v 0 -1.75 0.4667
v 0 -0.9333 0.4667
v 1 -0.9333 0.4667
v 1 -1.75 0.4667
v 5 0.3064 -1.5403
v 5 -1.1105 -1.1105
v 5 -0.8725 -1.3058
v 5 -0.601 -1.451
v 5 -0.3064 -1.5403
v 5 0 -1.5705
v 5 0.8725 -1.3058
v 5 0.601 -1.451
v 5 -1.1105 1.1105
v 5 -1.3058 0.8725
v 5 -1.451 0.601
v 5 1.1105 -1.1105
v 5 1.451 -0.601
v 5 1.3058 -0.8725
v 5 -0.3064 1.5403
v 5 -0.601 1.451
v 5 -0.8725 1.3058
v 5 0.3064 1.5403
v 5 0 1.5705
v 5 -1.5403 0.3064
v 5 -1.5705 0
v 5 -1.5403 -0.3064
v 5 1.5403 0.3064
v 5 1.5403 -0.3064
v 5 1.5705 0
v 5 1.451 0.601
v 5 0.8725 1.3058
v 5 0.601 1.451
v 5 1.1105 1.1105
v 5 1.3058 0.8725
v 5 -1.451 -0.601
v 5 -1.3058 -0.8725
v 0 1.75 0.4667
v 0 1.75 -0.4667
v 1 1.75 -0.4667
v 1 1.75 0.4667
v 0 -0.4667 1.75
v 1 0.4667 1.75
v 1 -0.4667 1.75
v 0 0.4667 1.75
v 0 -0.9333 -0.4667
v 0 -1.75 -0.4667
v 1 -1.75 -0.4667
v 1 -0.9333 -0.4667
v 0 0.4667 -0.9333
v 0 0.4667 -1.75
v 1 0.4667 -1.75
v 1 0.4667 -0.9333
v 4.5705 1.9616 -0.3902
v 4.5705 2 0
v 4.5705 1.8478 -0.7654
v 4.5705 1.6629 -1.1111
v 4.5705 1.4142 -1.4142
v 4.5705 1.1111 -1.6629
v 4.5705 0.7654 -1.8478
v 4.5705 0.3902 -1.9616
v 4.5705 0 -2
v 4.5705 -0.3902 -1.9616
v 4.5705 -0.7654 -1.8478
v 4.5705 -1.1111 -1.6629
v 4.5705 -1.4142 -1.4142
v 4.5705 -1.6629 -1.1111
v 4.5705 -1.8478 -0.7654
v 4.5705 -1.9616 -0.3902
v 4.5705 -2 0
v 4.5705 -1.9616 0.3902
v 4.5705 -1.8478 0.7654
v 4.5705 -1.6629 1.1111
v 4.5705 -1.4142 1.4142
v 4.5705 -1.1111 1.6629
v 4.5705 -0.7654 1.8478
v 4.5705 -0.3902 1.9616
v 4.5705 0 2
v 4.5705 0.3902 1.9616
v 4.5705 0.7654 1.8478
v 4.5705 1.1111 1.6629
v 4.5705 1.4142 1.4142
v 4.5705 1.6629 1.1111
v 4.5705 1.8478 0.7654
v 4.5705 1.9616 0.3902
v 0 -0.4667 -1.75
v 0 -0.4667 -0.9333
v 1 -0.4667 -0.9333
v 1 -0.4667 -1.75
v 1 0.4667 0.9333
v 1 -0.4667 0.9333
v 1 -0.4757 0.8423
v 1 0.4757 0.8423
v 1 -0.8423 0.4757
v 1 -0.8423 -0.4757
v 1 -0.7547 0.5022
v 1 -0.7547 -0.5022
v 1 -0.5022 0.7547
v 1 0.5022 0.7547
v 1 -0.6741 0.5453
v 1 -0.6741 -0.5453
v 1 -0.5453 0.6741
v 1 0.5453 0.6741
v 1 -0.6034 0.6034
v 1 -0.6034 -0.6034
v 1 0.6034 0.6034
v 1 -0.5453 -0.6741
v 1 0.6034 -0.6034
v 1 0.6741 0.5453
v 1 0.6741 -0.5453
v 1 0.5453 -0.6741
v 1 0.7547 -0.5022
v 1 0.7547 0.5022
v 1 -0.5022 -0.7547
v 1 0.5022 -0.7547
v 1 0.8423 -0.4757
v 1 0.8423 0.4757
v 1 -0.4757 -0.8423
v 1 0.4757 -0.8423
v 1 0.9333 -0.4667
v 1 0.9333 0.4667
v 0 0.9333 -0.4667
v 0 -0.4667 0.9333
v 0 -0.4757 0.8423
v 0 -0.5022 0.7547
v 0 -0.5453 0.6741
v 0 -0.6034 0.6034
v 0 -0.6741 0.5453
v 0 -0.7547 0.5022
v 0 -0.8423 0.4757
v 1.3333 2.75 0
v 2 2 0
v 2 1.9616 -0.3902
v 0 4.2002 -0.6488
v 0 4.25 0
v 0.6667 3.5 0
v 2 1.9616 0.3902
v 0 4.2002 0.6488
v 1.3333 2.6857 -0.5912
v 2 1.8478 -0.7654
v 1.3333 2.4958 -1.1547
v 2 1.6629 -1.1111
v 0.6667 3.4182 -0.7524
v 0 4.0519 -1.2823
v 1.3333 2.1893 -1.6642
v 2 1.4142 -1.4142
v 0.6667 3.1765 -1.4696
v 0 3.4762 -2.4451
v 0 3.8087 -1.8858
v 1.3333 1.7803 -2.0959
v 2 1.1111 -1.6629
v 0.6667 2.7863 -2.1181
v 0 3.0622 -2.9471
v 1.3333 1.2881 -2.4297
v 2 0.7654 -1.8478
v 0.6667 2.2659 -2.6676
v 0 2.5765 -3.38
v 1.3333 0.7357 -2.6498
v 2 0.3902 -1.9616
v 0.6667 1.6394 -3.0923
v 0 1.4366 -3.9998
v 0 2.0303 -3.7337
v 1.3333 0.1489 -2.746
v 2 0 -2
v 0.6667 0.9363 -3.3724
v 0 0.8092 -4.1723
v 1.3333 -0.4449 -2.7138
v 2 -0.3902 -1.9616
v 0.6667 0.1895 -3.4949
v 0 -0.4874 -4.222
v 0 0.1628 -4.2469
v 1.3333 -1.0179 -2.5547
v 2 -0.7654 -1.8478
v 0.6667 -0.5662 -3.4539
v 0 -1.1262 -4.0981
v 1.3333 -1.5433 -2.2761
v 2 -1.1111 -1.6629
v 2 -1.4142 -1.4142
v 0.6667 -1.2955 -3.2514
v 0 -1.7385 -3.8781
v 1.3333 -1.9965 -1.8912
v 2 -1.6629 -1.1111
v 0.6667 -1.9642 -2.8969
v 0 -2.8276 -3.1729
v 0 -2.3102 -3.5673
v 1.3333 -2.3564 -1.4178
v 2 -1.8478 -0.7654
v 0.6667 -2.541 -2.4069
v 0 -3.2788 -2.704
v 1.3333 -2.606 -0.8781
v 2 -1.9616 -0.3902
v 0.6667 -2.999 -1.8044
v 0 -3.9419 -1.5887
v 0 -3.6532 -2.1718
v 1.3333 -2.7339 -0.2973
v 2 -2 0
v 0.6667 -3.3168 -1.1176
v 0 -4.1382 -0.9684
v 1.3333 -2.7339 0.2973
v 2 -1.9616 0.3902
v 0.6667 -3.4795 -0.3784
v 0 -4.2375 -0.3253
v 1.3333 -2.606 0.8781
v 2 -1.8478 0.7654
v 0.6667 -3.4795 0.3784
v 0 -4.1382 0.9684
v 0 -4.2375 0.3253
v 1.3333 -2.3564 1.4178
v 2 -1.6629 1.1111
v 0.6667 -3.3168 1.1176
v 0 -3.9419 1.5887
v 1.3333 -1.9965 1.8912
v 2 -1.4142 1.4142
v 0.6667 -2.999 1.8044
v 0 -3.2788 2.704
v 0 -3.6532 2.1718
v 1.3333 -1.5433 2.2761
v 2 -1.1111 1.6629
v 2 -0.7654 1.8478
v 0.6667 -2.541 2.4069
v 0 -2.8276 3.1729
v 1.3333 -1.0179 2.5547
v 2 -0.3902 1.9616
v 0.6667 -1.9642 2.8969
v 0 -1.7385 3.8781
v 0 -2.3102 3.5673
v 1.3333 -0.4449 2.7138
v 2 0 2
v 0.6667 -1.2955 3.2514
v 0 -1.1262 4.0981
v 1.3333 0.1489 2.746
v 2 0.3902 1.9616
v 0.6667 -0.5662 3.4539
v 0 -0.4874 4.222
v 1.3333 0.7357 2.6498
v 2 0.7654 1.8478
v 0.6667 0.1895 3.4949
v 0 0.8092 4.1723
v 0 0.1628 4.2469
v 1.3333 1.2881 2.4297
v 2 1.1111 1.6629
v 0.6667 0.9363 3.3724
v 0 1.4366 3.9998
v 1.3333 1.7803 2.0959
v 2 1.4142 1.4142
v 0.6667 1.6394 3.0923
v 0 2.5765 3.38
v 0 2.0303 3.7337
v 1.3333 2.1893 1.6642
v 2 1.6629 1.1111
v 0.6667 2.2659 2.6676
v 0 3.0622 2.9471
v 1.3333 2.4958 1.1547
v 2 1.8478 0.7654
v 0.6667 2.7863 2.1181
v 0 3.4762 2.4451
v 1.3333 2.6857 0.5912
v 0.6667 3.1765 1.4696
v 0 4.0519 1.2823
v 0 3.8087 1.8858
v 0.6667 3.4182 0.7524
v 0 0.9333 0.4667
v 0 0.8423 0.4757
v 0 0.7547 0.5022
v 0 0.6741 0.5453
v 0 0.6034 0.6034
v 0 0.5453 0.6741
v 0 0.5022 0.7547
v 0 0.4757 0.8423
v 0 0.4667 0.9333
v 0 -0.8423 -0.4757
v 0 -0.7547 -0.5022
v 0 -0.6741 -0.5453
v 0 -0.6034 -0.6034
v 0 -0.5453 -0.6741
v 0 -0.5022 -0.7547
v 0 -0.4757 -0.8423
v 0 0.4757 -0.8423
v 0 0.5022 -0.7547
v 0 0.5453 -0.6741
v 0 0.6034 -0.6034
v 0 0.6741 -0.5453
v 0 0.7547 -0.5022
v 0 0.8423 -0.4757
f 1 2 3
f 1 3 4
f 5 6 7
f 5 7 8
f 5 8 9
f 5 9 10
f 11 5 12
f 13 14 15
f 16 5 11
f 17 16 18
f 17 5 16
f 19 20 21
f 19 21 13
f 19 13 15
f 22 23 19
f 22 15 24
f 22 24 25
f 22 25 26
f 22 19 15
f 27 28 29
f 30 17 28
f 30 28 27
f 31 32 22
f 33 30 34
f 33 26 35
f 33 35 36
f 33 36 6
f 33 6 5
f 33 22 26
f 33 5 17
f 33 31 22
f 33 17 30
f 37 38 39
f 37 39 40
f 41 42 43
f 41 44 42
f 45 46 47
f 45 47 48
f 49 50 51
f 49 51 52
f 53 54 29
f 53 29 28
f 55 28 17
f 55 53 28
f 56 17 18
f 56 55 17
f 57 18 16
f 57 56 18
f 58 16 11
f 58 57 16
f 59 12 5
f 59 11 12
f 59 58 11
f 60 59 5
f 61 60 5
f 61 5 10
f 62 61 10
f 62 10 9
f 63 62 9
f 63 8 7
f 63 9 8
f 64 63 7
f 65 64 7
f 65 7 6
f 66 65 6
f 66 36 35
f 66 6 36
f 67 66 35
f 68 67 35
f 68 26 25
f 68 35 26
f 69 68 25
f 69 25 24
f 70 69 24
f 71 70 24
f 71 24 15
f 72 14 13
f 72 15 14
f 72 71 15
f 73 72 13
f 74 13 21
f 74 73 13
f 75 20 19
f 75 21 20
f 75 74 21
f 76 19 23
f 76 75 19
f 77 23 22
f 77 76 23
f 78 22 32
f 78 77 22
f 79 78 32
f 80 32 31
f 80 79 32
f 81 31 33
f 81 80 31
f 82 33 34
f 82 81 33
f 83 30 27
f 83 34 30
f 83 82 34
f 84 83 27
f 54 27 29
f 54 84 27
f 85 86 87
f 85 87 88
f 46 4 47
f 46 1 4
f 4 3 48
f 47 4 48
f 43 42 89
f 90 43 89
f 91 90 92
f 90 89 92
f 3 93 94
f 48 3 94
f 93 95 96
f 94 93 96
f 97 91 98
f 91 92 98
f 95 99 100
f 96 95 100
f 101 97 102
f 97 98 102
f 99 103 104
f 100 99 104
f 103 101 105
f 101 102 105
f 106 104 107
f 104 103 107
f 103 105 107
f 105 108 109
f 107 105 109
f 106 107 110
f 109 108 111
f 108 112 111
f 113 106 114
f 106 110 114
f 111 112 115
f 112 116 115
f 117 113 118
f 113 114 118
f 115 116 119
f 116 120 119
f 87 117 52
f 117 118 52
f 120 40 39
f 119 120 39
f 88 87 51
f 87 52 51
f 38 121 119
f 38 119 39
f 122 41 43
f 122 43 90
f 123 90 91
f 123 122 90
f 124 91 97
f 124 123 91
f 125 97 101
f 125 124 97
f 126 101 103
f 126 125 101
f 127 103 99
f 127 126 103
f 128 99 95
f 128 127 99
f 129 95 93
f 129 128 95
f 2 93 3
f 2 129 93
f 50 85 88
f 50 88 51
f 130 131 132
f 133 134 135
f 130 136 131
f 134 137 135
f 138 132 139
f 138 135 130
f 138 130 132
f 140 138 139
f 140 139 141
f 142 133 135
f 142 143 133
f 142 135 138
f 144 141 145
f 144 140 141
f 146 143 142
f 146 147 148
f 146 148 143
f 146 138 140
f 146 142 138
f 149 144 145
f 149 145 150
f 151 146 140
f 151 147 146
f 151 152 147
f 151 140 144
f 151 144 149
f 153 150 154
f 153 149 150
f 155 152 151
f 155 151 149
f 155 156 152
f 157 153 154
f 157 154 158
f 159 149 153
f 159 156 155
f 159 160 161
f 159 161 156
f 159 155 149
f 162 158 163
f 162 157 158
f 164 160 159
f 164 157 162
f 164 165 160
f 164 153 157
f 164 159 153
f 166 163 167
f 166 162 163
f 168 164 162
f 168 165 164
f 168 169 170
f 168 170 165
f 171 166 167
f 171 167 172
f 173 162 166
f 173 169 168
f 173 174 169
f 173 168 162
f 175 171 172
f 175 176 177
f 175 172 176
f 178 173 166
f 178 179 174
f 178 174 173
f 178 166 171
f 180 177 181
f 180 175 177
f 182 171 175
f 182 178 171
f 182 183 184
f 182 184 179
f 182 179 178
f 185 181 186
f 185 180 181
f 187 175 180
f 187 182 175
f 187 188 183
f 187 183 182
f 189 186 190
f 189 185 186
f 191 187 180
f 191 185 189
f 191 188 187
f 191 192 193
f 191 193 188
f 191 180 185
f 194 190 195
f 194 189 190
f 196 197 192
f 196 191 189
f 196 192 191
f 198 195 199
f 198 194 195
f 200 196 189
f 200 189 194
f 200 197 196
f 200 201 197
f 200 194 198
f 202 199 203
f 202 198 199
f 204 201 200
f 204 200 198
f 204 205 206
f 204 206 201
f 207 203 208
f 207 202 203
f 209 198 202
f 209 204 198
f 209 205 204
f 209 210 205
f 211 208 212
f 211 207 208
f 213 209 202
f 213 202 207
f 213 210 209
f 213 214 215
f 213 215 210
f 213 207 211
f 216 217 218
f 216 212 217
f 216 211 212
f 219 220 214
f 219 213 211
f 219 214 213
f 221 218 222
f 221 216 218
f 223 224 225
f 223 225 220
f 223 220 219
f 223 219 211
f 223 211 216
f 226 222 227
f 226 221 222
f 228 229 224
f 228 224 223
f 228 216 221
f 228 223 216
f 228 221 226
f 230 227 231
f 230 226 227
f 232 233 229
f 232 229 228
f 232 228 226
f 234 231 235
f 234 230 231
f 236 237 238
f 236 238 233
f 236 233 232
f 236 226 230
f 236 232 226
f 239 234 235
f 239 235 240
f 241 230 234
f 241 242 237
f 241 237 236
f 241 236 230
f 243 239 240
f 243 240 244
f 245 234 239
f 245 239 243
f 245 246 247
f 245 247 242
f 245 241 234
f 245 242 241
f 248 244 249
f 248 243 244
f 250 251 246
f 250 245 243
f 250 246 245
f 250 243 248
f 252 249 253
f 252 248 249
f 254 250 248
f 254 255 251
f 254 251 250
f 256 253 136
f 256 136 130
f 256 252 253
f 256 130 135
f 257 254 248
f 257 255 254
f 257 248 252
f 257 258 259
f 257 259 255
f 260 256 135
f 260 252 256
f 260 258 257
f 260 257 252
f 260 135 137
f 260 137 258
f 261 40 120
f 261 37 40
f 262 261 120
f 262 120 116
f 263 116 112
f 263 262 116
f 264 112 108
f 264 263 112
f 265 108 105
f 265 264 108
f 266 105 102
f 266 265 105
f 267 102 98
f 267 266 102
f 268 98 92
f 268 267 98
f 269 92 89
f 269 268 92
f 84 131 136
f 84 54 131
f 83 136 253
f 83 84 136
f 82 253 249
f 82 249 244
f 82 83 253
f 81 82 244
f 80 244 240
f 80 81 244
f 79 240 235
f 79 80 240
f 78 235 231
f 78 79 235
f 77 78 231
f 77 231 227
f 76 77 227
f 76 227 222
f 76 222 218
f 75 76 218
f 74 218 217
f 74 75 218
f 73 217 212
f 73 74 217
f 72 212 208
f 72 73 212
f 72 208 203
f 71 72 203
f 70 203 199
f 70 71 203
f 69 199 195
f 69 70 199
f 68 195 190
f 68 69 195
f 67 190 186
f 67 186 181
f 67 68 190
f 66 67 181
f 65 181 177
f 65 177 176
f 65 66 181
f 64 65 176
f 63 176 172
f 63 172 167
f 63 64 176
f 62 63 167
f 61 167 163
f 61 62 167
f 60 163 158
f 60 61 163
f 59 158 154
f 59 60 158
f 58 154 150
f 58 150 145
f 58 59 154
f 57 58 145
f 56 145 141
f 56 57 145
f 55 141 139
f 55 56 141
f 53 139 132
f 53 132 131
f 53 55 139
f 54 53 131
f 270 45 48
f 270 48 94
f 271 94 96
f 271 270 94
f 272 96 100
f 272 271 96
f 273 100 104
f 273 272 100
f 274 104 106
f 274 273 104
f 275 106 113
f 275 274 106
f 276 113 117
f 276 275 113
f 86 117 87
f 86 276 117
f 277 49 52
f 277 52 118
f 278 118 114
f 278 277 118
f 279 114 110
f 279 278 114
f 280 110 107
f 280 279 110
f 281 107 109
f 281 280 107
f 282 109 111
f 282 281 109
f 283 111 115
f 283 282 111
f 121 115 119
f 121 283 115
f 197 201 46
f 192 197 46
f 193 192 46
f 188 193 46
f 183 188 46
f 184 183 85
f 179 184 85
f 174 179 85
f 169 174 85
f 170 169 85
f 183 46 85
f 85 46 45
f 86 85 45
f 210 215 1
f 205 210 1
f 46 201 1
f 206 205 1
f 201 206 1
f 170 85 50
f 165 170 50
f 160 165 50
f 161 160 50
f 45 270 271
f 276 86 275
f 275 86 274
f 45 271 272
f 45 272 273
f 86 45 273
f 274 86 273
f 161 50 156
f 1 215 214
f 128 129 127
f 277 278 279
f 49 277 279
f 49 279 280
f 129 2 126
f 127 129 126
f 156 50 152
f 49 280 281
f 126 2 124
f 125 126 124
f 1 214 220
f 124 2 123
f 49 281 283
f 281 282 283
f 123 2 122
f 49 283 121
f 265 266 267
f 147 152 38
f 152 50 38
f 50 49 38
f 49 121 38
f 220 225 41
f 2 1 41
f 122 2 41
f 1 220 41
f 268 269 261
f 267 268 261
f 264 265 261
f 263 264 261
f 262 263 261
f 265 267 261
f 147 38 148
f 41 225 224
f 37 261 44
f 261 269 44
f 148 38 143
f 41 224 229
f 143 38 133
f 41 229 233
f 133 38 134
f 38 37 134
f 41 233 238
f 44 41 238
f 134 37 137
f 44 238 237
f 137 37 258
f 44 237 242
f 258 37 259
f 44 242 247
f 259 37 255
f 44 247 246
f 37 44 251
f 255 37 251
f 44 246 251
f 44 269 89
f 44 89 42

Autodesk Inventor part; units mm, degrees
sketch "Sketch_1" plane through (0, 0, 0) normal (0, 0, 1) x (1, 0, 0)
  line L0 (5, 0) -> (0, 0)
  line L1 (0, 0) -> (0, 4.25)
  line L2 (0, 4.25) -> (2, 2)
  line L3 (2, 2) -> (4.5705, 2)
  line L4 (4.5705, 2) -> (5, 1.5705)
  line L5 (5, 1.5705) -> (5, 0)
  line L6 (5, 0) -> (0, 0)
revolve "Revolution1" add sketch "Sketch_1" angle 360 about axis through (5, 0, 0) along (1, 0, 0)
thread "Thread1" size "M4x0.7" class "6g" standard "ISO Metric profile" length 1.8266
sketch "_____1" plane through (0, 0, 0) normal (1, 0, 0) x (0, 0, -1)
  line L0 (-1.75, 0.4667) -> (-1.75, -0.4667)
  line L1 (-1.75, -0.4667) -> (-0.9333, -0.4667)
  arc A0 (-0.4667, -0.9333) -> (-0.9333, -0.4667) centre (-0.9333, -0.9333) ccw
  line L2 (-0.4667, -0.9333) -> (-0.4667, -1.75)
  line L3 (-0.4667, -1.75) -> (0.4667, -1.75)
  line L4 (0.4667, -1.75) -> (0.4667, -0.9333)
  arc A1 (0.9333, -0.4667) -> (0.4667, -0.9333) centre (0.9333, -0.9333) ccw
  line L5 (0.9333, -0.4667) -> (1.75, -0.4667)
  line L6 (1.75, -0.4667) -> (1.75, 0.4667)
  line L7 (1.75, 0.4667) -> (0.9333, 0.4667)
  arc A2 (0.4667, 0.9333) -> (0.9333, 0.4667) centre (0.9333, 0.9333) ccw
  line L8 (0.4667, 0.9333) -> (0.4667, 1.75)
  line L9 (0.4667, 1.75) -> (-0.4667, 1.75)
  line L10 (-0.4667, 1.75) -> (-0.4667, 0.9333)
  arc A3 (-0.9333, 0.4667) -> (-0.4667, 0.9333) centre (-0.9333, 0.9333) ccw
  line L11 (-0.9333, 0.4667) -> (-1.75, 0.4667)
extrude "Extrusion1" cut sketch "_____1" along normal blind 1
ref_plane "screw_XY" through (2, 0, 0) normal (1, 0, 0) x (0, 0, -1)
ref_plane "screw_YZ" through (2, 0, 0) normal (0, 0, -1) x (0, 1, 0)
ref_plane "screw_ZX" through (2, 0, 0) normal (0, 1, 0) x (1, 0, 0)
properties part number "FBb4-5"
